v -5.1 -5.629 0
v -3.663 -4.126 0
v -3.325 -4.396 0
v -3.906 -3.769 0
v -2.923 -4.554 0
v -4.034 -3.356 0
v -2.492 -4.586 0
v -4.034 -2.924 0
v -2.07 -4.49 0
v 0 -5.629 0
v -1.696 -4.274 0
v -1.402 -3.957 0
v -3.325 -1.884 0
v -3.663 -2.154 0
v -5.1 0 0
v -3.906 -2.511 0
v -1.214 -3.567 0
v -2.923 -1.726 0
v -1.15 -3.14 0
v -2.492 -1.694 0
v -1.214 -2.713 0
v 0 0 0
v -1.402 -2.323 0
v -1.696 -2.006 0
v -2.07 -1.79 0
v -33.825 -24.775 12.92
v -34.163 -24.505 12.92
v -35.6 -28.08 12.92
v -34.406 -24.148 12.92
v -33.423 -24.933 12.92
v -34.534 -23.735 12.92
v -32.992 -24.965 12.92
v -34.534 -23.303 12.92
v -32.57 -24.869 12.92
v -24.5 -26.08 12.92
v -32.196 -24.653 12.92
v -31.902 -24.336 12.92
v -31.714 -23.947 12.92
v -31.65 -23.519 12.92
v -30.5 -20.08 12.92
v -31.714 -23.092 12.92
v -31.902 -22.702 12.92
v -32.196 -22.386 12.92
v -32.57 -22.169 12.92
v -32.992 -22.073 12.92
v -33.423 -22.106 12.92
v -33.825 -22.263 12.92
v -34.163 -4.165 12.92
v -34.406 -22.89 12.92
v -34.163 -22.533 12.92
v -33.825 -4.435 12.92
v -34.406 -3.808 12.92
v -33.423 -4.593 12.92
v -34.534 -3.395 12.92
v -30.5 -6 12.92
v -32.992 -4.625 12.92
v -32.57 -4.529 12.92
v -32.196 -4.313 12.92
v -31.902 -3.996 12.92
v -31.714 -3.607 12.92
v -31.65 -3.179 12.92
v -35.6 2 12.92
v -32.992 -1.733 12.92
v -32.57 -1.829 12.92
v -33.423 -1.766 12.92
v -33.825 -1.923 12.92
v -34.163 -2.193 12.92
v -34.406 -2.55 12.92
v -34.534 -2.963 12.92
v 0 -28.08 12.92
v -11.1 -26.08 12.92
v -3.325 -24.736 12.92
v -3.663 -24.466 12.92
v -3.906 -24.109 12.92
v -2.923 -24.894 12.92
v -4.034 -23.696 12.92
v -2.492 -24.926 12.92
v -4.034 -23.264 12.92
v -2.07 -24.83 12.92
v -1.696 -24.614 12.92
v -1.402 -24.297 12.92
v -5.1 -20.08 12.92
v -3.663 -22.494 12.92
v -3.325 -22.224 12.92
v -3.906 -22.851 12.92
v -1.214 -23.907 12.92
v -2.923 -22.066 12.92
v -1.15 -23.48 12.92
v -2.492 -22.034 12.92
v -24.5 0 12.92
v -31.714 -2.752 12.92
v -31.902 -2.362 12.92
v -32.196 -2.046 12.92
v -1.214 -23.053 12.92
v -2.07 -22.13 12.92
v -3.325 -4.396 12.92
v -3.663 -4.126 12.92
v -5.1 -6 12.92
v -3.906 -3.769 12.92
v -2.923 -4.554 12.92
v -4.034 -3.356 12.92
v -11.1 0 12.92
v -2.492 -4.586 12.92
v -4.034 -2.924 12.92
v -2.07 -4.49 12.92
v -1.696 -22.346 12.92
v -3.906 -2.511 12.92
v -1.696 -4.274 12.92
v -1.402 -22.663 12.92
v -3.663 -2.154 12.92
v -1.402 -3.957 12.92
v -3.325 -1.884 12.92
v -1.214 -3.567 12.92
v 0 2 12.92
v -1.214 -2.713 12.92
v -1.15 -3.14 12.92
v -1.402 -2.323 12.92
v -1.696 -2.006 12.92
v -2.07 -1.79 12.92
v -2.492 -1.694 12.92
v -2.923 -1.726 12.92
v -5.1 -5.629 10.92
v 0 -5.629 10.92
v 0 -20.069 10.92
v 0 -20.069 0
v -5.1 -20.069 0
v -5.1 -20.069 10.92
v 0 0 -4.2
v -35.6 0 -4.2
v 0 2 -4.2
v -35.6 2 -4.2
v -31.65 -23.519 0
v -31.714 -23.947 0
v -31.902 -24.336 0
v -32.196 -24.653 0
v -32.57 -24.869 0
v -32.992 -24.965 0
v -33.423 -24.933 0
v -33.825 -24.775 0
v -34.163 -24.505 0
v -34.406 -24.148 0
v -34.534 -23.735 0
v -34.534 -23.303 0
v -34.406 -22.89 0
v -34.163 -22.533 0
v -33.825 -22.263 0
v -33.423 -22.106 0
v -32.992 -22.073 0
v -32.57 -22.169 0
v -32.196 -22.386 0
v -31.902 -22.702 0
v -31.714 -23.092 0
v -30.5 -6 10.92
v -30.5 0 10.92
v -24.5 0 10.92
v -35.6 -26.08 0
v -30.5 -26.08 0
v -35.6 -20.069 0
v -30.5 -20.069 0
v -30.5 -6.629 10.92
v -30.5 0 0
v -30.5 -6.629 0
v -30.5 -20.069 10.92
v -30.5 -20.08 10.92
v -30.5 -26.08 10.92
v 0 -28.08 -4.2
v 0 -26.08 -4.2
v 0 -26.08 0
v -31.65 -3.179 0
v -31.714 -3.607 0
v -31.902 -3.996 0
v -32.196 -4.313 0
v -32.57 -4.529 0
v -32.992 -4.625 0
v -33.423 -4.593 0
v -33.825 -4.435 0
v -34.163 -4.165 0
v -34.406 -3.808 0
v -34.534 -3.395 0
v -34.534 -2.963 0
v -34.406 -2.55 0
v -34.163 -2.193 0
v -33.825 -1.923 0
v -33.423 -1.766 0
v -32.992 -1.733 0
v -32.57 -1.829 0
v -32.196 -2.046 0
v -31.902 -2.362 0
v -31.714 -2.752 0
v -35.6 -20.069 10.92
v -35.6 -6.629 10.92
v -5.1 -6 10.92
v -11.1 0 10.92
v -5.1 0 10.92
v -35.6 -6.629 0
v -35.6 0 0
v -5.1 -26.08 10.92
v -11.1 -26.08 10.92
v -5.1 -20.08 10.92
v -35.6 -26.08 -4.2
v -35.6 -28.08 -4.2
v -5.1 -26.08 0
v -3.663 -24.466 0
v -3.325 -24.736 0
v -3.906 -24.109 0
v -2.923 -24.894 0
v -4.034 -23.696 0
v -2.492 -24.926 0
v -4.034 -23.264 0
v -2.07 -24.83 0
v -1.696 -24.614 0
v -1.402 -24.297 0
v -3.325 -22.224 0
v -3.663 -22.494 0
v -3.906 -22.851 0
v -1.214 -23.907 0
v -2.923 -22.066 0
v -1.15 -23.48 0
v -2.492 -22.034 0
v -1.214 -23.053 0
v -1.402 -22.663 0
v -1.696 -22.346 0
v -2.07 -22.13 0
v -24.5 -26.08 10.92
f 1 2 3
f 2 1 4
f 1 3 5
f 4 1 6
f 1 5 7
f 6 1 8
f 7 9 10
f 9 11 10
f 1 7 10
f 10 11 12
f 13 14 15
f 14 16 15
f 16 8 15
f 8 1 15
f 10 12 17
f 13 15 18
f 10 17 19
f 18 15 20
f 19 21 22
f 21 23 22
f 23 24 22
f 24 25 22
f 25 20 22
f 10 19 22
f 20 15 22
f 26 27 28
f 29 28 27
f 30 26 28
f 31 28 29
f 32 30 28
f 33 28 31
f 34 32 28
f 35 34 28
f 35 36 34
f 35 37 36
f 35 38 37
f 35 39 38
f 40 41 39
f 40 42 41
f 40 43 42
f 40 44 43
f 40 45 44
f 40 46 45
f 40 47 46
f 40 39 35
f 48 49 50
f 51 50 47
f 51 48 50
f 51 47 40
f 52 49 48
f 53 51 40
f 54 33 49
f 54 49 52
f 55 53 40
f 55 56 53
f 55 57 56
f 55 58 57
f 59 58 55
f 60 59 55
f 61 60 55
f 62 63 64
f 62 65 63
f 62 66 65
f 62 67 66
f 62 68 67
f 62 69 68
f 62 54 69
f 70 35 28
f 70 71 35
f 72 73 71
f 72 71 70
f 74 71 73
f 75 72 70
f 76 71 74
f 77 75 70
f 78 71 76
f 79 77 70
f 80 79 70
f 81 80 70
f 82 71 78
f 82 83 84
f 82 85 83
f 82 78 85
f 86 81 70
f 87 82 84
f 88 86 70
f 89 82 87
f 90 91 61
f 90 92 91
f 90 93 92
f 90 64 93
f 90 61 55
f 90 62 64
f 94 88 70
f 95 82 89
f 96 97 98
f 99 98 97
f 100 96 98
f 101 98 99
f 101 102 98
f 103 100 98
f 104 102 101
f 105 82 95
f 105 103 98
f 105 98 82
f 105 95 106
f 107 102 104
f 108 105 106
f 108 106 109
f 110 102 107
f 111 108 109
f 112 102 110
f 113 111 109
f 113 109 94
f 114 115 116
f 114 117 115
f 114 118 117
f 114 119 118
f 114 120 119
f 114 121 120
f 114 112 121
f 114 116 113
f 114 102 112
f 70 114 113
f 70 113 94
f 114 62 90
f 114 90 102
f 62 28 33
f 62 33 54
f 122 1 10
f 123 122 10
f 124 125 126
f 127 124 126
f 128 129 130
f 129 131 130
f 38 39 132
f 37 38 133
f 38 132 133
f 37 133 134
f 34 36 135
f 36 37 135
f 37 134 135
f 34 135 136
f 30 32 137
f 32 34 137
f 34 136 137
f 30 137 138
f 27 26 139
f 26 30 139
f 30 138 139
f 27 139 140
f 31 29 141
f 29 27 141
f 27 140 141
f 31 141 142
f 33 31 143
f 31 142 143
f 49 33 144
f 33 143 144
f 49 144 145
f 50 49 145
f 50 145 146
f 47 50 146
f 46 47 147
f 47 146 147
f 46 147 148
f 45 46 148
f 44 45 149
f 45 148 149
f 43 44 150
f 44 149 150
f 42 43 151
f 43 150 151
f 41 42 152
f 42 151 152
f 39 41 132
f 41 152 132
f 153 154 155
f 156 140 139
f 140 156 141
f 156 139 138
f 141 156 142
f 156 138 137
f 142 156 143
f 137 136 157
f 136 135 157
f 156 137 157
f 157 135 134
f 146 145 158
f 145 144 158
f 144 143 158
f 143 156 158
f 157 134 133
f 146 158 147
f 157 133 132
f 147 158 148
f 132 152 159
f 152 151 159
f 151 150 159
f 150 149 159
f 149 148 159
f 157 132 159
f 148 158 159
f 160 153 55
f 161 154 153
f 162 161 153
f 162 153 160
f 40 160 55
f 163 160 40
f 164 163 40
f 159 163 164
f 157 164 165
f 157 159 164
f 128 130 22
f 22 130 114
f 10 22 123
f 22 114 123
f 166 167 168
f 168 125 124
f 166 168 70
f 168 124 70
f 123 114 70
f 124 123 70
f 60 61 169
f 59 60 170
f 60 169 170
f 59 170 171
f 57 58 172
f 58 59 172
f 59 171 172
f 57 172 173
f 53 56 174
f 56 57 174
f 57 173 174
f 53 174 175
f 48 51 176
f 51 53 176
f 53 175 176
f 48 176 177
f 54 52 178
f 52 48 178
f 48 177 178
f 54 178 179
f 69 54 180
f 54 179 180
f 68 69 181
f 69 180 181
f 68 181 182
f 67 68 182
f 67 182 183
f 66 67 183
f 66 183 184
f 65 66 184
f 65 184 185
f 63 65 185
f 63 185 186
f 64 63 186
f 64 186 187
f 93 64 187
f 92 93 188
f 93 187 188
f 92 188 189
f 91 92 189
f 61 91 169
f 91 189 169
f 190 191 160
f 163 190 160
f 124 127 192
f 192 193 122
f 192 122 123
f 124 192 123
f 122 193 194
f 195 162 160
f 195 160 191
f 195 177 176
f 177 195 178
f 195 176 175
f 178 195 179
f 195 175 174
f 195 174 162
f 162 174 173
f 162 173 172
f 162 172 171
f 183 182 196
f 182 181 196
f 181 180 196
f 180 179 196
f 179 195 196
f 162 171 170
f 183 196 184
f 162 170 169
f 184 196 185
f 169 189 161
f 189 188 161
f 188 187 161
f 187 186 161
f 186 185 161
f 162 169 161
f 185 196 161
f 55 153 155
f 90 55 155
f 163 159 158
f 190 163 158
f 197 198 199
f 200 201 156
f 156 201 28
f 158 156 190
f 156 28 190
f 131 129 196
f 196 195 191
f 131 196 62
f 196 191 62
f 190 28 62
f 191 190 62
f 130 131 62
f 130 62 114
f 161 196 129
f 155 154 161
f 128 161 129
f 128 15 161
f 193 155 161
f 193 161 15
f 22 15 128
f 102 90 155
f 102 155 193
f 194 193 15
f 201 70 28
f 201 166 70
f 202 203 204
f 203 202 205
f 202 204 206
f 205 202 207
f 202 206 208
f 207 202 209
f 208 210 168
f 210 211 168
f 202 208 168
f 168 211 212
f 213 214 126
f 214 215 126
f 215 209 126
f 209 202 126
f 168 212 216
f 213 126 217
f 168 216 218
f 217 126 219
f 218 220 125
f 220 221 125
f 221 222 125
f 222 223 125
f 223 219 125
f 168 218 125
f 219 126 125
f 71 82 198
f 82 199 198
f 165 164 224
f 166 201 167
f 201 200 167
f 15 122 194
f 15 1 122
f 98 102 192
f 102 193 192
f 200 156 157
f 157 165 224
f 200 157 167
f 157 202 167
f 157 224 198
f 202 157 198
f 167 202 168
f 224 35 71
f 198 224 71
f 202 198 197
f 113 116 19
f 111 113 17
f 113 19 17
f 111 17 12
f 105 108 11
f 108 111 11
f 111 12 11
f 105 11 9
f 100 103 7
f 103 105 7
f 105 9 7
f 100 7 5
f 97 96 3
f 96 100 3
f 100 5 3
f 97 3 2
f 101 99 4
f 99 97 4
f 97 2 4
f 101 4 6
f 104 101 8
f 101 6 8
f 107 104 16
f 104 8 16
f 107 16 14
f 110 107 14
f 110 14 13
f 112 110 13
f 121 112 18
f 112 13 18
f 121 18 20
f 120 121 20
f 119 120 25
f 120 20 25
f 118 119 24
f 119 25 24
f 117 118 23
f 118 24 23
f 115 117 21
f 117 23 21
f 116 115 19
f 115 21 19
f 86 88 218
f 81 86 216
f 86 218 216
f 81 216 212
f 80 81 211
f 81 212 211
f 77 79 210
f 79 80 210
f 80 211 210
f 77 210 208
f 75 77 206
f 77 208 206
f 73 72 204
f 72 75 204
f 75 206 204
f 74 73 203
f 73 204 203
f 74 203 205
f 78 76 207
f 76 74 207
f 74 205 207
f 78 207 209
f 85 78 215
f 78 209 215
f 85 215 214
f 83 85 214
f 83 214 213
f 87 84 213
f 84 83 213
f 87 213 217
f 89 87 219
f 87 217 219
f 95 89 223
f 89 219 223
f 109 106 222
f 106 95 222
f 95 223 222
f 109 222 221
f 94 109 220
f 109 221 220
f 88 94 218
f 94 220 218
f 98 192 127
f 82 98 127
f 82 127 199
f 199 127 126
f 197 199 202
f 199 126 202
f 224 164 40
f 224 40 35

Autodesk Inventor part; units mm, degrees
ref_plane "Work Plane1" through (0, 0, 0) normal (0, 0, 1) x (1, 0, 0)
sketch "Sketch1" plane through (0, 0, 0) normal (0, 0, 1) x (1, 0, 0)
  line L0 (0, -26.08) -> (0, 0)
  line L1 (0, 0) -> (-35.6, 0)
  line L2 (-35.6, -26.08) -> (0, -26.08)
  line L3 (-35.6, 0) -> (-35.6, -26.08)
  circle A0 centre (-2.6, -23.48) radius 1.45
  circle A1 centre (-2.6, -3.14) radius 1.45
  circle A2 centre (-33.1, -3.1792) radius 1.45
  circle A3 centre (-33.1, -23.5192) radius 1.45
  line L4 (-30.5, -20.0692) -> (-35.6, -20.0692)
  line L5 (-30.5, -6.6292) -> (-35.6, -6.6292)
  line L6 (-5.1, -5.6288) -> (0, -5.6288)
  line L7 (0, -5.6288) -> (0, 0)
  line L8 (-35.6, -26.08) -> (-35.6, -20.0692)
  line L9 (-35.6, -6.6292) -> (-35.6, 0)
  line L10 (0, -26.08) -> (0, -22.0692)
  line L11 (0, -22.0692) -> (0, -20.0692)
  line L12 (0, -20.0692) -> (-3.1, -20.0692)
  line L13 (-3.1, -20.0692) -> (-5.1, -20.0692)
  line L14 (-17.8, -25.74) -> (-5.1, -25.74)
  line L15 (-5.1, -25.74) -> (-5.1, -0.34)
  line L16 (-5.1, -0.34) -> (-30.5, -0.34)
  line L17 (-30.5, -0.34) -> (-30.5, -25.74)
  line L18 (-30.5, -25.74) -> (-17.8, -25.74)
  line L19 (-5.1, -25.74) -> (-5.1, -26.08)
  line L20 (-5.1, -26.08) -> (0, -26.08)
  line L21 (-30.5, -25.74) -> (-30.5, -26.08)
  line L22 (-35.6, -26.08) -> (-30.5, -26.08)
  line L23 (-30.5, -0.34) -> (-30.5, 0)
  line L24 (-30.5, 0) -> (-35.6, 0)
  line L25 (-5.1, -0.34) -> (-5.1, 0)
  line L26 (-5.1, 0) -> (0, 0)
  line L27 (-5.1, -26.08) -> (-30.5, -26.08)
  line L28 (-30.5, 0) -> (-5.1, 0)
  point P0 (-30.5, 0)
  point P1 (-5.1, 0)
ref_plane "Work Plane2" through (-34.2906, -29.9214, 10.92) normal (0, 0, 1) x (0.9132, 0.4074, 0)
extrude "Extrusion1" add sketch "Sketch1" along normal up to surface (10.92 mm away) contours L2 L19 L15 L13 L12 L0 | L2 L3 L4 L17 L21 | L6 L15 L25 L1 L0 | L3 L1 L23 L17 L5
sketch "Sketch2" plane through (-5.1, -26.08, 10.92) normal (0, 0, 1) x (1, 0, 0)
  line L0 (-30.5, 0) -> (5.1, 0) projected
  line L1 (5.1, 0) -> (5.1, 26.08) projected
  line L2 (0, 26.08) -> (5.1, 26.08) projected
  line L3 (5.1, 26.08) -> (-30.5, 26.08) projected
  line L4 (-30.5, 26.08) -> (-30.5, 0) projected
  circle A0 centre (-28, 2.5608) radius 1.45 projected
  circle A1 centre (-28, 22.9008) radius 1.45 projected
  circle A2 centre (2.5, 2.6) radius 1.45 projected
  circle A3 centre (2.5, 22.94) radius 1.45 projected
  line L5 (5.1, 0) -> (5.1, -2)
  line L6 (5.1, -2) -> (-30.5, -2)
  line L7 (-30.5, 0) -> (-25.4, 0) projected
  line L8 (-30.5, -2) -> (-30.5, 0)
  line L9 (-30.5, 19.4508) -> (-30.5, 26.08) projected
  line L10 (-30.5, 0) -> (-30.5, 26.08)
  line L11 (-30.5, 26.08) -> (-30.5, 28.08)
  line L12 (-30.5, 28.08) -> (0, 28.08)
  line L13 (0, 28.08) -> (5.1, 28.08)
  line L14 (5.1, 26.08) -> (5.1, 20.4512) projected
  line L15 (5.1, 28.08) -> (5.1, 26.08)
  line L16 (0, 20.4512) -> (0, 26.08) projected
  line L17 (0, 26.08) -> (0, 20.08)
  line L18 (0, 26.08) -> (-6, 26.08)
  line L19 (-6, 26.08) -> (0, 20.08)
  line L20 (-25.4, 19.4508) -> (-25.4, 26.08) projected
  line L21 (-25.4, 26.08) -> (-19.4, 26.08)
  line L22 (-25.4, 26.08) -> (-25.4, 20.08)
  line L23 (-25.4, 20.08) -> (-19.4, 26.08)
  line L24 (-25.4, 0) -> (-19.4, 0)
  line L25 (-25.4, 0) -> (-25.4, 6)
  line L26 (-25.4, 6.0108) -> (-25.4, 0) projected
  line L27 (-25.4, 6) -> (-19.4, 0)
  line L28 (0, 0) -> (-6, 0)
  line L29 (0, 6.0108) -> (0, 0) projected
  line L30 (0, 0) -> (0, 6)
  line L31 (0, 6) -> (-6, 0)
  line L32 (0, 6) -> (0, 20.08)
  line L33 (-25.4, 20.08) -> (-25.4, 6.0108)
  dimension "d19" = 2
  dimension "d20" = 2
  dimension "d21" = 6
  dimension "d22" = 6
  dimension "d23" = 6
  dimension "d24" = 6
  dimension "d25" = 6
  dimension "d26" = 6
  dimension "d27" = 6
  dimension "d28" = 6
extrude "Extrusion2" add sketch "Sketch2" along normal blind 2 contours L4 L3 L20 L33 L26 L25 L0 | L0 L5 L6 L8 | L25 L27 L0 | L11 L12 L13 L15 L2 L3 | L31 L29 L0 | L3 L23 L20 | L0 L29 L32 L17 L16 L2 L1 | L3 L16 L17 L19
ref_plane "Work Plane3" through (-53.6, -42.75, -4.2) normal (0, 0, -1) x (0, 1, 0)
extrude "Extrusion3" add sketch "Sketch2" against normal up to surface (15.12 mm away) contours L0 L5 L6 L8 | L11 L12 L13 L15 L2 L3
properties part number "gps_antenna_cover"
